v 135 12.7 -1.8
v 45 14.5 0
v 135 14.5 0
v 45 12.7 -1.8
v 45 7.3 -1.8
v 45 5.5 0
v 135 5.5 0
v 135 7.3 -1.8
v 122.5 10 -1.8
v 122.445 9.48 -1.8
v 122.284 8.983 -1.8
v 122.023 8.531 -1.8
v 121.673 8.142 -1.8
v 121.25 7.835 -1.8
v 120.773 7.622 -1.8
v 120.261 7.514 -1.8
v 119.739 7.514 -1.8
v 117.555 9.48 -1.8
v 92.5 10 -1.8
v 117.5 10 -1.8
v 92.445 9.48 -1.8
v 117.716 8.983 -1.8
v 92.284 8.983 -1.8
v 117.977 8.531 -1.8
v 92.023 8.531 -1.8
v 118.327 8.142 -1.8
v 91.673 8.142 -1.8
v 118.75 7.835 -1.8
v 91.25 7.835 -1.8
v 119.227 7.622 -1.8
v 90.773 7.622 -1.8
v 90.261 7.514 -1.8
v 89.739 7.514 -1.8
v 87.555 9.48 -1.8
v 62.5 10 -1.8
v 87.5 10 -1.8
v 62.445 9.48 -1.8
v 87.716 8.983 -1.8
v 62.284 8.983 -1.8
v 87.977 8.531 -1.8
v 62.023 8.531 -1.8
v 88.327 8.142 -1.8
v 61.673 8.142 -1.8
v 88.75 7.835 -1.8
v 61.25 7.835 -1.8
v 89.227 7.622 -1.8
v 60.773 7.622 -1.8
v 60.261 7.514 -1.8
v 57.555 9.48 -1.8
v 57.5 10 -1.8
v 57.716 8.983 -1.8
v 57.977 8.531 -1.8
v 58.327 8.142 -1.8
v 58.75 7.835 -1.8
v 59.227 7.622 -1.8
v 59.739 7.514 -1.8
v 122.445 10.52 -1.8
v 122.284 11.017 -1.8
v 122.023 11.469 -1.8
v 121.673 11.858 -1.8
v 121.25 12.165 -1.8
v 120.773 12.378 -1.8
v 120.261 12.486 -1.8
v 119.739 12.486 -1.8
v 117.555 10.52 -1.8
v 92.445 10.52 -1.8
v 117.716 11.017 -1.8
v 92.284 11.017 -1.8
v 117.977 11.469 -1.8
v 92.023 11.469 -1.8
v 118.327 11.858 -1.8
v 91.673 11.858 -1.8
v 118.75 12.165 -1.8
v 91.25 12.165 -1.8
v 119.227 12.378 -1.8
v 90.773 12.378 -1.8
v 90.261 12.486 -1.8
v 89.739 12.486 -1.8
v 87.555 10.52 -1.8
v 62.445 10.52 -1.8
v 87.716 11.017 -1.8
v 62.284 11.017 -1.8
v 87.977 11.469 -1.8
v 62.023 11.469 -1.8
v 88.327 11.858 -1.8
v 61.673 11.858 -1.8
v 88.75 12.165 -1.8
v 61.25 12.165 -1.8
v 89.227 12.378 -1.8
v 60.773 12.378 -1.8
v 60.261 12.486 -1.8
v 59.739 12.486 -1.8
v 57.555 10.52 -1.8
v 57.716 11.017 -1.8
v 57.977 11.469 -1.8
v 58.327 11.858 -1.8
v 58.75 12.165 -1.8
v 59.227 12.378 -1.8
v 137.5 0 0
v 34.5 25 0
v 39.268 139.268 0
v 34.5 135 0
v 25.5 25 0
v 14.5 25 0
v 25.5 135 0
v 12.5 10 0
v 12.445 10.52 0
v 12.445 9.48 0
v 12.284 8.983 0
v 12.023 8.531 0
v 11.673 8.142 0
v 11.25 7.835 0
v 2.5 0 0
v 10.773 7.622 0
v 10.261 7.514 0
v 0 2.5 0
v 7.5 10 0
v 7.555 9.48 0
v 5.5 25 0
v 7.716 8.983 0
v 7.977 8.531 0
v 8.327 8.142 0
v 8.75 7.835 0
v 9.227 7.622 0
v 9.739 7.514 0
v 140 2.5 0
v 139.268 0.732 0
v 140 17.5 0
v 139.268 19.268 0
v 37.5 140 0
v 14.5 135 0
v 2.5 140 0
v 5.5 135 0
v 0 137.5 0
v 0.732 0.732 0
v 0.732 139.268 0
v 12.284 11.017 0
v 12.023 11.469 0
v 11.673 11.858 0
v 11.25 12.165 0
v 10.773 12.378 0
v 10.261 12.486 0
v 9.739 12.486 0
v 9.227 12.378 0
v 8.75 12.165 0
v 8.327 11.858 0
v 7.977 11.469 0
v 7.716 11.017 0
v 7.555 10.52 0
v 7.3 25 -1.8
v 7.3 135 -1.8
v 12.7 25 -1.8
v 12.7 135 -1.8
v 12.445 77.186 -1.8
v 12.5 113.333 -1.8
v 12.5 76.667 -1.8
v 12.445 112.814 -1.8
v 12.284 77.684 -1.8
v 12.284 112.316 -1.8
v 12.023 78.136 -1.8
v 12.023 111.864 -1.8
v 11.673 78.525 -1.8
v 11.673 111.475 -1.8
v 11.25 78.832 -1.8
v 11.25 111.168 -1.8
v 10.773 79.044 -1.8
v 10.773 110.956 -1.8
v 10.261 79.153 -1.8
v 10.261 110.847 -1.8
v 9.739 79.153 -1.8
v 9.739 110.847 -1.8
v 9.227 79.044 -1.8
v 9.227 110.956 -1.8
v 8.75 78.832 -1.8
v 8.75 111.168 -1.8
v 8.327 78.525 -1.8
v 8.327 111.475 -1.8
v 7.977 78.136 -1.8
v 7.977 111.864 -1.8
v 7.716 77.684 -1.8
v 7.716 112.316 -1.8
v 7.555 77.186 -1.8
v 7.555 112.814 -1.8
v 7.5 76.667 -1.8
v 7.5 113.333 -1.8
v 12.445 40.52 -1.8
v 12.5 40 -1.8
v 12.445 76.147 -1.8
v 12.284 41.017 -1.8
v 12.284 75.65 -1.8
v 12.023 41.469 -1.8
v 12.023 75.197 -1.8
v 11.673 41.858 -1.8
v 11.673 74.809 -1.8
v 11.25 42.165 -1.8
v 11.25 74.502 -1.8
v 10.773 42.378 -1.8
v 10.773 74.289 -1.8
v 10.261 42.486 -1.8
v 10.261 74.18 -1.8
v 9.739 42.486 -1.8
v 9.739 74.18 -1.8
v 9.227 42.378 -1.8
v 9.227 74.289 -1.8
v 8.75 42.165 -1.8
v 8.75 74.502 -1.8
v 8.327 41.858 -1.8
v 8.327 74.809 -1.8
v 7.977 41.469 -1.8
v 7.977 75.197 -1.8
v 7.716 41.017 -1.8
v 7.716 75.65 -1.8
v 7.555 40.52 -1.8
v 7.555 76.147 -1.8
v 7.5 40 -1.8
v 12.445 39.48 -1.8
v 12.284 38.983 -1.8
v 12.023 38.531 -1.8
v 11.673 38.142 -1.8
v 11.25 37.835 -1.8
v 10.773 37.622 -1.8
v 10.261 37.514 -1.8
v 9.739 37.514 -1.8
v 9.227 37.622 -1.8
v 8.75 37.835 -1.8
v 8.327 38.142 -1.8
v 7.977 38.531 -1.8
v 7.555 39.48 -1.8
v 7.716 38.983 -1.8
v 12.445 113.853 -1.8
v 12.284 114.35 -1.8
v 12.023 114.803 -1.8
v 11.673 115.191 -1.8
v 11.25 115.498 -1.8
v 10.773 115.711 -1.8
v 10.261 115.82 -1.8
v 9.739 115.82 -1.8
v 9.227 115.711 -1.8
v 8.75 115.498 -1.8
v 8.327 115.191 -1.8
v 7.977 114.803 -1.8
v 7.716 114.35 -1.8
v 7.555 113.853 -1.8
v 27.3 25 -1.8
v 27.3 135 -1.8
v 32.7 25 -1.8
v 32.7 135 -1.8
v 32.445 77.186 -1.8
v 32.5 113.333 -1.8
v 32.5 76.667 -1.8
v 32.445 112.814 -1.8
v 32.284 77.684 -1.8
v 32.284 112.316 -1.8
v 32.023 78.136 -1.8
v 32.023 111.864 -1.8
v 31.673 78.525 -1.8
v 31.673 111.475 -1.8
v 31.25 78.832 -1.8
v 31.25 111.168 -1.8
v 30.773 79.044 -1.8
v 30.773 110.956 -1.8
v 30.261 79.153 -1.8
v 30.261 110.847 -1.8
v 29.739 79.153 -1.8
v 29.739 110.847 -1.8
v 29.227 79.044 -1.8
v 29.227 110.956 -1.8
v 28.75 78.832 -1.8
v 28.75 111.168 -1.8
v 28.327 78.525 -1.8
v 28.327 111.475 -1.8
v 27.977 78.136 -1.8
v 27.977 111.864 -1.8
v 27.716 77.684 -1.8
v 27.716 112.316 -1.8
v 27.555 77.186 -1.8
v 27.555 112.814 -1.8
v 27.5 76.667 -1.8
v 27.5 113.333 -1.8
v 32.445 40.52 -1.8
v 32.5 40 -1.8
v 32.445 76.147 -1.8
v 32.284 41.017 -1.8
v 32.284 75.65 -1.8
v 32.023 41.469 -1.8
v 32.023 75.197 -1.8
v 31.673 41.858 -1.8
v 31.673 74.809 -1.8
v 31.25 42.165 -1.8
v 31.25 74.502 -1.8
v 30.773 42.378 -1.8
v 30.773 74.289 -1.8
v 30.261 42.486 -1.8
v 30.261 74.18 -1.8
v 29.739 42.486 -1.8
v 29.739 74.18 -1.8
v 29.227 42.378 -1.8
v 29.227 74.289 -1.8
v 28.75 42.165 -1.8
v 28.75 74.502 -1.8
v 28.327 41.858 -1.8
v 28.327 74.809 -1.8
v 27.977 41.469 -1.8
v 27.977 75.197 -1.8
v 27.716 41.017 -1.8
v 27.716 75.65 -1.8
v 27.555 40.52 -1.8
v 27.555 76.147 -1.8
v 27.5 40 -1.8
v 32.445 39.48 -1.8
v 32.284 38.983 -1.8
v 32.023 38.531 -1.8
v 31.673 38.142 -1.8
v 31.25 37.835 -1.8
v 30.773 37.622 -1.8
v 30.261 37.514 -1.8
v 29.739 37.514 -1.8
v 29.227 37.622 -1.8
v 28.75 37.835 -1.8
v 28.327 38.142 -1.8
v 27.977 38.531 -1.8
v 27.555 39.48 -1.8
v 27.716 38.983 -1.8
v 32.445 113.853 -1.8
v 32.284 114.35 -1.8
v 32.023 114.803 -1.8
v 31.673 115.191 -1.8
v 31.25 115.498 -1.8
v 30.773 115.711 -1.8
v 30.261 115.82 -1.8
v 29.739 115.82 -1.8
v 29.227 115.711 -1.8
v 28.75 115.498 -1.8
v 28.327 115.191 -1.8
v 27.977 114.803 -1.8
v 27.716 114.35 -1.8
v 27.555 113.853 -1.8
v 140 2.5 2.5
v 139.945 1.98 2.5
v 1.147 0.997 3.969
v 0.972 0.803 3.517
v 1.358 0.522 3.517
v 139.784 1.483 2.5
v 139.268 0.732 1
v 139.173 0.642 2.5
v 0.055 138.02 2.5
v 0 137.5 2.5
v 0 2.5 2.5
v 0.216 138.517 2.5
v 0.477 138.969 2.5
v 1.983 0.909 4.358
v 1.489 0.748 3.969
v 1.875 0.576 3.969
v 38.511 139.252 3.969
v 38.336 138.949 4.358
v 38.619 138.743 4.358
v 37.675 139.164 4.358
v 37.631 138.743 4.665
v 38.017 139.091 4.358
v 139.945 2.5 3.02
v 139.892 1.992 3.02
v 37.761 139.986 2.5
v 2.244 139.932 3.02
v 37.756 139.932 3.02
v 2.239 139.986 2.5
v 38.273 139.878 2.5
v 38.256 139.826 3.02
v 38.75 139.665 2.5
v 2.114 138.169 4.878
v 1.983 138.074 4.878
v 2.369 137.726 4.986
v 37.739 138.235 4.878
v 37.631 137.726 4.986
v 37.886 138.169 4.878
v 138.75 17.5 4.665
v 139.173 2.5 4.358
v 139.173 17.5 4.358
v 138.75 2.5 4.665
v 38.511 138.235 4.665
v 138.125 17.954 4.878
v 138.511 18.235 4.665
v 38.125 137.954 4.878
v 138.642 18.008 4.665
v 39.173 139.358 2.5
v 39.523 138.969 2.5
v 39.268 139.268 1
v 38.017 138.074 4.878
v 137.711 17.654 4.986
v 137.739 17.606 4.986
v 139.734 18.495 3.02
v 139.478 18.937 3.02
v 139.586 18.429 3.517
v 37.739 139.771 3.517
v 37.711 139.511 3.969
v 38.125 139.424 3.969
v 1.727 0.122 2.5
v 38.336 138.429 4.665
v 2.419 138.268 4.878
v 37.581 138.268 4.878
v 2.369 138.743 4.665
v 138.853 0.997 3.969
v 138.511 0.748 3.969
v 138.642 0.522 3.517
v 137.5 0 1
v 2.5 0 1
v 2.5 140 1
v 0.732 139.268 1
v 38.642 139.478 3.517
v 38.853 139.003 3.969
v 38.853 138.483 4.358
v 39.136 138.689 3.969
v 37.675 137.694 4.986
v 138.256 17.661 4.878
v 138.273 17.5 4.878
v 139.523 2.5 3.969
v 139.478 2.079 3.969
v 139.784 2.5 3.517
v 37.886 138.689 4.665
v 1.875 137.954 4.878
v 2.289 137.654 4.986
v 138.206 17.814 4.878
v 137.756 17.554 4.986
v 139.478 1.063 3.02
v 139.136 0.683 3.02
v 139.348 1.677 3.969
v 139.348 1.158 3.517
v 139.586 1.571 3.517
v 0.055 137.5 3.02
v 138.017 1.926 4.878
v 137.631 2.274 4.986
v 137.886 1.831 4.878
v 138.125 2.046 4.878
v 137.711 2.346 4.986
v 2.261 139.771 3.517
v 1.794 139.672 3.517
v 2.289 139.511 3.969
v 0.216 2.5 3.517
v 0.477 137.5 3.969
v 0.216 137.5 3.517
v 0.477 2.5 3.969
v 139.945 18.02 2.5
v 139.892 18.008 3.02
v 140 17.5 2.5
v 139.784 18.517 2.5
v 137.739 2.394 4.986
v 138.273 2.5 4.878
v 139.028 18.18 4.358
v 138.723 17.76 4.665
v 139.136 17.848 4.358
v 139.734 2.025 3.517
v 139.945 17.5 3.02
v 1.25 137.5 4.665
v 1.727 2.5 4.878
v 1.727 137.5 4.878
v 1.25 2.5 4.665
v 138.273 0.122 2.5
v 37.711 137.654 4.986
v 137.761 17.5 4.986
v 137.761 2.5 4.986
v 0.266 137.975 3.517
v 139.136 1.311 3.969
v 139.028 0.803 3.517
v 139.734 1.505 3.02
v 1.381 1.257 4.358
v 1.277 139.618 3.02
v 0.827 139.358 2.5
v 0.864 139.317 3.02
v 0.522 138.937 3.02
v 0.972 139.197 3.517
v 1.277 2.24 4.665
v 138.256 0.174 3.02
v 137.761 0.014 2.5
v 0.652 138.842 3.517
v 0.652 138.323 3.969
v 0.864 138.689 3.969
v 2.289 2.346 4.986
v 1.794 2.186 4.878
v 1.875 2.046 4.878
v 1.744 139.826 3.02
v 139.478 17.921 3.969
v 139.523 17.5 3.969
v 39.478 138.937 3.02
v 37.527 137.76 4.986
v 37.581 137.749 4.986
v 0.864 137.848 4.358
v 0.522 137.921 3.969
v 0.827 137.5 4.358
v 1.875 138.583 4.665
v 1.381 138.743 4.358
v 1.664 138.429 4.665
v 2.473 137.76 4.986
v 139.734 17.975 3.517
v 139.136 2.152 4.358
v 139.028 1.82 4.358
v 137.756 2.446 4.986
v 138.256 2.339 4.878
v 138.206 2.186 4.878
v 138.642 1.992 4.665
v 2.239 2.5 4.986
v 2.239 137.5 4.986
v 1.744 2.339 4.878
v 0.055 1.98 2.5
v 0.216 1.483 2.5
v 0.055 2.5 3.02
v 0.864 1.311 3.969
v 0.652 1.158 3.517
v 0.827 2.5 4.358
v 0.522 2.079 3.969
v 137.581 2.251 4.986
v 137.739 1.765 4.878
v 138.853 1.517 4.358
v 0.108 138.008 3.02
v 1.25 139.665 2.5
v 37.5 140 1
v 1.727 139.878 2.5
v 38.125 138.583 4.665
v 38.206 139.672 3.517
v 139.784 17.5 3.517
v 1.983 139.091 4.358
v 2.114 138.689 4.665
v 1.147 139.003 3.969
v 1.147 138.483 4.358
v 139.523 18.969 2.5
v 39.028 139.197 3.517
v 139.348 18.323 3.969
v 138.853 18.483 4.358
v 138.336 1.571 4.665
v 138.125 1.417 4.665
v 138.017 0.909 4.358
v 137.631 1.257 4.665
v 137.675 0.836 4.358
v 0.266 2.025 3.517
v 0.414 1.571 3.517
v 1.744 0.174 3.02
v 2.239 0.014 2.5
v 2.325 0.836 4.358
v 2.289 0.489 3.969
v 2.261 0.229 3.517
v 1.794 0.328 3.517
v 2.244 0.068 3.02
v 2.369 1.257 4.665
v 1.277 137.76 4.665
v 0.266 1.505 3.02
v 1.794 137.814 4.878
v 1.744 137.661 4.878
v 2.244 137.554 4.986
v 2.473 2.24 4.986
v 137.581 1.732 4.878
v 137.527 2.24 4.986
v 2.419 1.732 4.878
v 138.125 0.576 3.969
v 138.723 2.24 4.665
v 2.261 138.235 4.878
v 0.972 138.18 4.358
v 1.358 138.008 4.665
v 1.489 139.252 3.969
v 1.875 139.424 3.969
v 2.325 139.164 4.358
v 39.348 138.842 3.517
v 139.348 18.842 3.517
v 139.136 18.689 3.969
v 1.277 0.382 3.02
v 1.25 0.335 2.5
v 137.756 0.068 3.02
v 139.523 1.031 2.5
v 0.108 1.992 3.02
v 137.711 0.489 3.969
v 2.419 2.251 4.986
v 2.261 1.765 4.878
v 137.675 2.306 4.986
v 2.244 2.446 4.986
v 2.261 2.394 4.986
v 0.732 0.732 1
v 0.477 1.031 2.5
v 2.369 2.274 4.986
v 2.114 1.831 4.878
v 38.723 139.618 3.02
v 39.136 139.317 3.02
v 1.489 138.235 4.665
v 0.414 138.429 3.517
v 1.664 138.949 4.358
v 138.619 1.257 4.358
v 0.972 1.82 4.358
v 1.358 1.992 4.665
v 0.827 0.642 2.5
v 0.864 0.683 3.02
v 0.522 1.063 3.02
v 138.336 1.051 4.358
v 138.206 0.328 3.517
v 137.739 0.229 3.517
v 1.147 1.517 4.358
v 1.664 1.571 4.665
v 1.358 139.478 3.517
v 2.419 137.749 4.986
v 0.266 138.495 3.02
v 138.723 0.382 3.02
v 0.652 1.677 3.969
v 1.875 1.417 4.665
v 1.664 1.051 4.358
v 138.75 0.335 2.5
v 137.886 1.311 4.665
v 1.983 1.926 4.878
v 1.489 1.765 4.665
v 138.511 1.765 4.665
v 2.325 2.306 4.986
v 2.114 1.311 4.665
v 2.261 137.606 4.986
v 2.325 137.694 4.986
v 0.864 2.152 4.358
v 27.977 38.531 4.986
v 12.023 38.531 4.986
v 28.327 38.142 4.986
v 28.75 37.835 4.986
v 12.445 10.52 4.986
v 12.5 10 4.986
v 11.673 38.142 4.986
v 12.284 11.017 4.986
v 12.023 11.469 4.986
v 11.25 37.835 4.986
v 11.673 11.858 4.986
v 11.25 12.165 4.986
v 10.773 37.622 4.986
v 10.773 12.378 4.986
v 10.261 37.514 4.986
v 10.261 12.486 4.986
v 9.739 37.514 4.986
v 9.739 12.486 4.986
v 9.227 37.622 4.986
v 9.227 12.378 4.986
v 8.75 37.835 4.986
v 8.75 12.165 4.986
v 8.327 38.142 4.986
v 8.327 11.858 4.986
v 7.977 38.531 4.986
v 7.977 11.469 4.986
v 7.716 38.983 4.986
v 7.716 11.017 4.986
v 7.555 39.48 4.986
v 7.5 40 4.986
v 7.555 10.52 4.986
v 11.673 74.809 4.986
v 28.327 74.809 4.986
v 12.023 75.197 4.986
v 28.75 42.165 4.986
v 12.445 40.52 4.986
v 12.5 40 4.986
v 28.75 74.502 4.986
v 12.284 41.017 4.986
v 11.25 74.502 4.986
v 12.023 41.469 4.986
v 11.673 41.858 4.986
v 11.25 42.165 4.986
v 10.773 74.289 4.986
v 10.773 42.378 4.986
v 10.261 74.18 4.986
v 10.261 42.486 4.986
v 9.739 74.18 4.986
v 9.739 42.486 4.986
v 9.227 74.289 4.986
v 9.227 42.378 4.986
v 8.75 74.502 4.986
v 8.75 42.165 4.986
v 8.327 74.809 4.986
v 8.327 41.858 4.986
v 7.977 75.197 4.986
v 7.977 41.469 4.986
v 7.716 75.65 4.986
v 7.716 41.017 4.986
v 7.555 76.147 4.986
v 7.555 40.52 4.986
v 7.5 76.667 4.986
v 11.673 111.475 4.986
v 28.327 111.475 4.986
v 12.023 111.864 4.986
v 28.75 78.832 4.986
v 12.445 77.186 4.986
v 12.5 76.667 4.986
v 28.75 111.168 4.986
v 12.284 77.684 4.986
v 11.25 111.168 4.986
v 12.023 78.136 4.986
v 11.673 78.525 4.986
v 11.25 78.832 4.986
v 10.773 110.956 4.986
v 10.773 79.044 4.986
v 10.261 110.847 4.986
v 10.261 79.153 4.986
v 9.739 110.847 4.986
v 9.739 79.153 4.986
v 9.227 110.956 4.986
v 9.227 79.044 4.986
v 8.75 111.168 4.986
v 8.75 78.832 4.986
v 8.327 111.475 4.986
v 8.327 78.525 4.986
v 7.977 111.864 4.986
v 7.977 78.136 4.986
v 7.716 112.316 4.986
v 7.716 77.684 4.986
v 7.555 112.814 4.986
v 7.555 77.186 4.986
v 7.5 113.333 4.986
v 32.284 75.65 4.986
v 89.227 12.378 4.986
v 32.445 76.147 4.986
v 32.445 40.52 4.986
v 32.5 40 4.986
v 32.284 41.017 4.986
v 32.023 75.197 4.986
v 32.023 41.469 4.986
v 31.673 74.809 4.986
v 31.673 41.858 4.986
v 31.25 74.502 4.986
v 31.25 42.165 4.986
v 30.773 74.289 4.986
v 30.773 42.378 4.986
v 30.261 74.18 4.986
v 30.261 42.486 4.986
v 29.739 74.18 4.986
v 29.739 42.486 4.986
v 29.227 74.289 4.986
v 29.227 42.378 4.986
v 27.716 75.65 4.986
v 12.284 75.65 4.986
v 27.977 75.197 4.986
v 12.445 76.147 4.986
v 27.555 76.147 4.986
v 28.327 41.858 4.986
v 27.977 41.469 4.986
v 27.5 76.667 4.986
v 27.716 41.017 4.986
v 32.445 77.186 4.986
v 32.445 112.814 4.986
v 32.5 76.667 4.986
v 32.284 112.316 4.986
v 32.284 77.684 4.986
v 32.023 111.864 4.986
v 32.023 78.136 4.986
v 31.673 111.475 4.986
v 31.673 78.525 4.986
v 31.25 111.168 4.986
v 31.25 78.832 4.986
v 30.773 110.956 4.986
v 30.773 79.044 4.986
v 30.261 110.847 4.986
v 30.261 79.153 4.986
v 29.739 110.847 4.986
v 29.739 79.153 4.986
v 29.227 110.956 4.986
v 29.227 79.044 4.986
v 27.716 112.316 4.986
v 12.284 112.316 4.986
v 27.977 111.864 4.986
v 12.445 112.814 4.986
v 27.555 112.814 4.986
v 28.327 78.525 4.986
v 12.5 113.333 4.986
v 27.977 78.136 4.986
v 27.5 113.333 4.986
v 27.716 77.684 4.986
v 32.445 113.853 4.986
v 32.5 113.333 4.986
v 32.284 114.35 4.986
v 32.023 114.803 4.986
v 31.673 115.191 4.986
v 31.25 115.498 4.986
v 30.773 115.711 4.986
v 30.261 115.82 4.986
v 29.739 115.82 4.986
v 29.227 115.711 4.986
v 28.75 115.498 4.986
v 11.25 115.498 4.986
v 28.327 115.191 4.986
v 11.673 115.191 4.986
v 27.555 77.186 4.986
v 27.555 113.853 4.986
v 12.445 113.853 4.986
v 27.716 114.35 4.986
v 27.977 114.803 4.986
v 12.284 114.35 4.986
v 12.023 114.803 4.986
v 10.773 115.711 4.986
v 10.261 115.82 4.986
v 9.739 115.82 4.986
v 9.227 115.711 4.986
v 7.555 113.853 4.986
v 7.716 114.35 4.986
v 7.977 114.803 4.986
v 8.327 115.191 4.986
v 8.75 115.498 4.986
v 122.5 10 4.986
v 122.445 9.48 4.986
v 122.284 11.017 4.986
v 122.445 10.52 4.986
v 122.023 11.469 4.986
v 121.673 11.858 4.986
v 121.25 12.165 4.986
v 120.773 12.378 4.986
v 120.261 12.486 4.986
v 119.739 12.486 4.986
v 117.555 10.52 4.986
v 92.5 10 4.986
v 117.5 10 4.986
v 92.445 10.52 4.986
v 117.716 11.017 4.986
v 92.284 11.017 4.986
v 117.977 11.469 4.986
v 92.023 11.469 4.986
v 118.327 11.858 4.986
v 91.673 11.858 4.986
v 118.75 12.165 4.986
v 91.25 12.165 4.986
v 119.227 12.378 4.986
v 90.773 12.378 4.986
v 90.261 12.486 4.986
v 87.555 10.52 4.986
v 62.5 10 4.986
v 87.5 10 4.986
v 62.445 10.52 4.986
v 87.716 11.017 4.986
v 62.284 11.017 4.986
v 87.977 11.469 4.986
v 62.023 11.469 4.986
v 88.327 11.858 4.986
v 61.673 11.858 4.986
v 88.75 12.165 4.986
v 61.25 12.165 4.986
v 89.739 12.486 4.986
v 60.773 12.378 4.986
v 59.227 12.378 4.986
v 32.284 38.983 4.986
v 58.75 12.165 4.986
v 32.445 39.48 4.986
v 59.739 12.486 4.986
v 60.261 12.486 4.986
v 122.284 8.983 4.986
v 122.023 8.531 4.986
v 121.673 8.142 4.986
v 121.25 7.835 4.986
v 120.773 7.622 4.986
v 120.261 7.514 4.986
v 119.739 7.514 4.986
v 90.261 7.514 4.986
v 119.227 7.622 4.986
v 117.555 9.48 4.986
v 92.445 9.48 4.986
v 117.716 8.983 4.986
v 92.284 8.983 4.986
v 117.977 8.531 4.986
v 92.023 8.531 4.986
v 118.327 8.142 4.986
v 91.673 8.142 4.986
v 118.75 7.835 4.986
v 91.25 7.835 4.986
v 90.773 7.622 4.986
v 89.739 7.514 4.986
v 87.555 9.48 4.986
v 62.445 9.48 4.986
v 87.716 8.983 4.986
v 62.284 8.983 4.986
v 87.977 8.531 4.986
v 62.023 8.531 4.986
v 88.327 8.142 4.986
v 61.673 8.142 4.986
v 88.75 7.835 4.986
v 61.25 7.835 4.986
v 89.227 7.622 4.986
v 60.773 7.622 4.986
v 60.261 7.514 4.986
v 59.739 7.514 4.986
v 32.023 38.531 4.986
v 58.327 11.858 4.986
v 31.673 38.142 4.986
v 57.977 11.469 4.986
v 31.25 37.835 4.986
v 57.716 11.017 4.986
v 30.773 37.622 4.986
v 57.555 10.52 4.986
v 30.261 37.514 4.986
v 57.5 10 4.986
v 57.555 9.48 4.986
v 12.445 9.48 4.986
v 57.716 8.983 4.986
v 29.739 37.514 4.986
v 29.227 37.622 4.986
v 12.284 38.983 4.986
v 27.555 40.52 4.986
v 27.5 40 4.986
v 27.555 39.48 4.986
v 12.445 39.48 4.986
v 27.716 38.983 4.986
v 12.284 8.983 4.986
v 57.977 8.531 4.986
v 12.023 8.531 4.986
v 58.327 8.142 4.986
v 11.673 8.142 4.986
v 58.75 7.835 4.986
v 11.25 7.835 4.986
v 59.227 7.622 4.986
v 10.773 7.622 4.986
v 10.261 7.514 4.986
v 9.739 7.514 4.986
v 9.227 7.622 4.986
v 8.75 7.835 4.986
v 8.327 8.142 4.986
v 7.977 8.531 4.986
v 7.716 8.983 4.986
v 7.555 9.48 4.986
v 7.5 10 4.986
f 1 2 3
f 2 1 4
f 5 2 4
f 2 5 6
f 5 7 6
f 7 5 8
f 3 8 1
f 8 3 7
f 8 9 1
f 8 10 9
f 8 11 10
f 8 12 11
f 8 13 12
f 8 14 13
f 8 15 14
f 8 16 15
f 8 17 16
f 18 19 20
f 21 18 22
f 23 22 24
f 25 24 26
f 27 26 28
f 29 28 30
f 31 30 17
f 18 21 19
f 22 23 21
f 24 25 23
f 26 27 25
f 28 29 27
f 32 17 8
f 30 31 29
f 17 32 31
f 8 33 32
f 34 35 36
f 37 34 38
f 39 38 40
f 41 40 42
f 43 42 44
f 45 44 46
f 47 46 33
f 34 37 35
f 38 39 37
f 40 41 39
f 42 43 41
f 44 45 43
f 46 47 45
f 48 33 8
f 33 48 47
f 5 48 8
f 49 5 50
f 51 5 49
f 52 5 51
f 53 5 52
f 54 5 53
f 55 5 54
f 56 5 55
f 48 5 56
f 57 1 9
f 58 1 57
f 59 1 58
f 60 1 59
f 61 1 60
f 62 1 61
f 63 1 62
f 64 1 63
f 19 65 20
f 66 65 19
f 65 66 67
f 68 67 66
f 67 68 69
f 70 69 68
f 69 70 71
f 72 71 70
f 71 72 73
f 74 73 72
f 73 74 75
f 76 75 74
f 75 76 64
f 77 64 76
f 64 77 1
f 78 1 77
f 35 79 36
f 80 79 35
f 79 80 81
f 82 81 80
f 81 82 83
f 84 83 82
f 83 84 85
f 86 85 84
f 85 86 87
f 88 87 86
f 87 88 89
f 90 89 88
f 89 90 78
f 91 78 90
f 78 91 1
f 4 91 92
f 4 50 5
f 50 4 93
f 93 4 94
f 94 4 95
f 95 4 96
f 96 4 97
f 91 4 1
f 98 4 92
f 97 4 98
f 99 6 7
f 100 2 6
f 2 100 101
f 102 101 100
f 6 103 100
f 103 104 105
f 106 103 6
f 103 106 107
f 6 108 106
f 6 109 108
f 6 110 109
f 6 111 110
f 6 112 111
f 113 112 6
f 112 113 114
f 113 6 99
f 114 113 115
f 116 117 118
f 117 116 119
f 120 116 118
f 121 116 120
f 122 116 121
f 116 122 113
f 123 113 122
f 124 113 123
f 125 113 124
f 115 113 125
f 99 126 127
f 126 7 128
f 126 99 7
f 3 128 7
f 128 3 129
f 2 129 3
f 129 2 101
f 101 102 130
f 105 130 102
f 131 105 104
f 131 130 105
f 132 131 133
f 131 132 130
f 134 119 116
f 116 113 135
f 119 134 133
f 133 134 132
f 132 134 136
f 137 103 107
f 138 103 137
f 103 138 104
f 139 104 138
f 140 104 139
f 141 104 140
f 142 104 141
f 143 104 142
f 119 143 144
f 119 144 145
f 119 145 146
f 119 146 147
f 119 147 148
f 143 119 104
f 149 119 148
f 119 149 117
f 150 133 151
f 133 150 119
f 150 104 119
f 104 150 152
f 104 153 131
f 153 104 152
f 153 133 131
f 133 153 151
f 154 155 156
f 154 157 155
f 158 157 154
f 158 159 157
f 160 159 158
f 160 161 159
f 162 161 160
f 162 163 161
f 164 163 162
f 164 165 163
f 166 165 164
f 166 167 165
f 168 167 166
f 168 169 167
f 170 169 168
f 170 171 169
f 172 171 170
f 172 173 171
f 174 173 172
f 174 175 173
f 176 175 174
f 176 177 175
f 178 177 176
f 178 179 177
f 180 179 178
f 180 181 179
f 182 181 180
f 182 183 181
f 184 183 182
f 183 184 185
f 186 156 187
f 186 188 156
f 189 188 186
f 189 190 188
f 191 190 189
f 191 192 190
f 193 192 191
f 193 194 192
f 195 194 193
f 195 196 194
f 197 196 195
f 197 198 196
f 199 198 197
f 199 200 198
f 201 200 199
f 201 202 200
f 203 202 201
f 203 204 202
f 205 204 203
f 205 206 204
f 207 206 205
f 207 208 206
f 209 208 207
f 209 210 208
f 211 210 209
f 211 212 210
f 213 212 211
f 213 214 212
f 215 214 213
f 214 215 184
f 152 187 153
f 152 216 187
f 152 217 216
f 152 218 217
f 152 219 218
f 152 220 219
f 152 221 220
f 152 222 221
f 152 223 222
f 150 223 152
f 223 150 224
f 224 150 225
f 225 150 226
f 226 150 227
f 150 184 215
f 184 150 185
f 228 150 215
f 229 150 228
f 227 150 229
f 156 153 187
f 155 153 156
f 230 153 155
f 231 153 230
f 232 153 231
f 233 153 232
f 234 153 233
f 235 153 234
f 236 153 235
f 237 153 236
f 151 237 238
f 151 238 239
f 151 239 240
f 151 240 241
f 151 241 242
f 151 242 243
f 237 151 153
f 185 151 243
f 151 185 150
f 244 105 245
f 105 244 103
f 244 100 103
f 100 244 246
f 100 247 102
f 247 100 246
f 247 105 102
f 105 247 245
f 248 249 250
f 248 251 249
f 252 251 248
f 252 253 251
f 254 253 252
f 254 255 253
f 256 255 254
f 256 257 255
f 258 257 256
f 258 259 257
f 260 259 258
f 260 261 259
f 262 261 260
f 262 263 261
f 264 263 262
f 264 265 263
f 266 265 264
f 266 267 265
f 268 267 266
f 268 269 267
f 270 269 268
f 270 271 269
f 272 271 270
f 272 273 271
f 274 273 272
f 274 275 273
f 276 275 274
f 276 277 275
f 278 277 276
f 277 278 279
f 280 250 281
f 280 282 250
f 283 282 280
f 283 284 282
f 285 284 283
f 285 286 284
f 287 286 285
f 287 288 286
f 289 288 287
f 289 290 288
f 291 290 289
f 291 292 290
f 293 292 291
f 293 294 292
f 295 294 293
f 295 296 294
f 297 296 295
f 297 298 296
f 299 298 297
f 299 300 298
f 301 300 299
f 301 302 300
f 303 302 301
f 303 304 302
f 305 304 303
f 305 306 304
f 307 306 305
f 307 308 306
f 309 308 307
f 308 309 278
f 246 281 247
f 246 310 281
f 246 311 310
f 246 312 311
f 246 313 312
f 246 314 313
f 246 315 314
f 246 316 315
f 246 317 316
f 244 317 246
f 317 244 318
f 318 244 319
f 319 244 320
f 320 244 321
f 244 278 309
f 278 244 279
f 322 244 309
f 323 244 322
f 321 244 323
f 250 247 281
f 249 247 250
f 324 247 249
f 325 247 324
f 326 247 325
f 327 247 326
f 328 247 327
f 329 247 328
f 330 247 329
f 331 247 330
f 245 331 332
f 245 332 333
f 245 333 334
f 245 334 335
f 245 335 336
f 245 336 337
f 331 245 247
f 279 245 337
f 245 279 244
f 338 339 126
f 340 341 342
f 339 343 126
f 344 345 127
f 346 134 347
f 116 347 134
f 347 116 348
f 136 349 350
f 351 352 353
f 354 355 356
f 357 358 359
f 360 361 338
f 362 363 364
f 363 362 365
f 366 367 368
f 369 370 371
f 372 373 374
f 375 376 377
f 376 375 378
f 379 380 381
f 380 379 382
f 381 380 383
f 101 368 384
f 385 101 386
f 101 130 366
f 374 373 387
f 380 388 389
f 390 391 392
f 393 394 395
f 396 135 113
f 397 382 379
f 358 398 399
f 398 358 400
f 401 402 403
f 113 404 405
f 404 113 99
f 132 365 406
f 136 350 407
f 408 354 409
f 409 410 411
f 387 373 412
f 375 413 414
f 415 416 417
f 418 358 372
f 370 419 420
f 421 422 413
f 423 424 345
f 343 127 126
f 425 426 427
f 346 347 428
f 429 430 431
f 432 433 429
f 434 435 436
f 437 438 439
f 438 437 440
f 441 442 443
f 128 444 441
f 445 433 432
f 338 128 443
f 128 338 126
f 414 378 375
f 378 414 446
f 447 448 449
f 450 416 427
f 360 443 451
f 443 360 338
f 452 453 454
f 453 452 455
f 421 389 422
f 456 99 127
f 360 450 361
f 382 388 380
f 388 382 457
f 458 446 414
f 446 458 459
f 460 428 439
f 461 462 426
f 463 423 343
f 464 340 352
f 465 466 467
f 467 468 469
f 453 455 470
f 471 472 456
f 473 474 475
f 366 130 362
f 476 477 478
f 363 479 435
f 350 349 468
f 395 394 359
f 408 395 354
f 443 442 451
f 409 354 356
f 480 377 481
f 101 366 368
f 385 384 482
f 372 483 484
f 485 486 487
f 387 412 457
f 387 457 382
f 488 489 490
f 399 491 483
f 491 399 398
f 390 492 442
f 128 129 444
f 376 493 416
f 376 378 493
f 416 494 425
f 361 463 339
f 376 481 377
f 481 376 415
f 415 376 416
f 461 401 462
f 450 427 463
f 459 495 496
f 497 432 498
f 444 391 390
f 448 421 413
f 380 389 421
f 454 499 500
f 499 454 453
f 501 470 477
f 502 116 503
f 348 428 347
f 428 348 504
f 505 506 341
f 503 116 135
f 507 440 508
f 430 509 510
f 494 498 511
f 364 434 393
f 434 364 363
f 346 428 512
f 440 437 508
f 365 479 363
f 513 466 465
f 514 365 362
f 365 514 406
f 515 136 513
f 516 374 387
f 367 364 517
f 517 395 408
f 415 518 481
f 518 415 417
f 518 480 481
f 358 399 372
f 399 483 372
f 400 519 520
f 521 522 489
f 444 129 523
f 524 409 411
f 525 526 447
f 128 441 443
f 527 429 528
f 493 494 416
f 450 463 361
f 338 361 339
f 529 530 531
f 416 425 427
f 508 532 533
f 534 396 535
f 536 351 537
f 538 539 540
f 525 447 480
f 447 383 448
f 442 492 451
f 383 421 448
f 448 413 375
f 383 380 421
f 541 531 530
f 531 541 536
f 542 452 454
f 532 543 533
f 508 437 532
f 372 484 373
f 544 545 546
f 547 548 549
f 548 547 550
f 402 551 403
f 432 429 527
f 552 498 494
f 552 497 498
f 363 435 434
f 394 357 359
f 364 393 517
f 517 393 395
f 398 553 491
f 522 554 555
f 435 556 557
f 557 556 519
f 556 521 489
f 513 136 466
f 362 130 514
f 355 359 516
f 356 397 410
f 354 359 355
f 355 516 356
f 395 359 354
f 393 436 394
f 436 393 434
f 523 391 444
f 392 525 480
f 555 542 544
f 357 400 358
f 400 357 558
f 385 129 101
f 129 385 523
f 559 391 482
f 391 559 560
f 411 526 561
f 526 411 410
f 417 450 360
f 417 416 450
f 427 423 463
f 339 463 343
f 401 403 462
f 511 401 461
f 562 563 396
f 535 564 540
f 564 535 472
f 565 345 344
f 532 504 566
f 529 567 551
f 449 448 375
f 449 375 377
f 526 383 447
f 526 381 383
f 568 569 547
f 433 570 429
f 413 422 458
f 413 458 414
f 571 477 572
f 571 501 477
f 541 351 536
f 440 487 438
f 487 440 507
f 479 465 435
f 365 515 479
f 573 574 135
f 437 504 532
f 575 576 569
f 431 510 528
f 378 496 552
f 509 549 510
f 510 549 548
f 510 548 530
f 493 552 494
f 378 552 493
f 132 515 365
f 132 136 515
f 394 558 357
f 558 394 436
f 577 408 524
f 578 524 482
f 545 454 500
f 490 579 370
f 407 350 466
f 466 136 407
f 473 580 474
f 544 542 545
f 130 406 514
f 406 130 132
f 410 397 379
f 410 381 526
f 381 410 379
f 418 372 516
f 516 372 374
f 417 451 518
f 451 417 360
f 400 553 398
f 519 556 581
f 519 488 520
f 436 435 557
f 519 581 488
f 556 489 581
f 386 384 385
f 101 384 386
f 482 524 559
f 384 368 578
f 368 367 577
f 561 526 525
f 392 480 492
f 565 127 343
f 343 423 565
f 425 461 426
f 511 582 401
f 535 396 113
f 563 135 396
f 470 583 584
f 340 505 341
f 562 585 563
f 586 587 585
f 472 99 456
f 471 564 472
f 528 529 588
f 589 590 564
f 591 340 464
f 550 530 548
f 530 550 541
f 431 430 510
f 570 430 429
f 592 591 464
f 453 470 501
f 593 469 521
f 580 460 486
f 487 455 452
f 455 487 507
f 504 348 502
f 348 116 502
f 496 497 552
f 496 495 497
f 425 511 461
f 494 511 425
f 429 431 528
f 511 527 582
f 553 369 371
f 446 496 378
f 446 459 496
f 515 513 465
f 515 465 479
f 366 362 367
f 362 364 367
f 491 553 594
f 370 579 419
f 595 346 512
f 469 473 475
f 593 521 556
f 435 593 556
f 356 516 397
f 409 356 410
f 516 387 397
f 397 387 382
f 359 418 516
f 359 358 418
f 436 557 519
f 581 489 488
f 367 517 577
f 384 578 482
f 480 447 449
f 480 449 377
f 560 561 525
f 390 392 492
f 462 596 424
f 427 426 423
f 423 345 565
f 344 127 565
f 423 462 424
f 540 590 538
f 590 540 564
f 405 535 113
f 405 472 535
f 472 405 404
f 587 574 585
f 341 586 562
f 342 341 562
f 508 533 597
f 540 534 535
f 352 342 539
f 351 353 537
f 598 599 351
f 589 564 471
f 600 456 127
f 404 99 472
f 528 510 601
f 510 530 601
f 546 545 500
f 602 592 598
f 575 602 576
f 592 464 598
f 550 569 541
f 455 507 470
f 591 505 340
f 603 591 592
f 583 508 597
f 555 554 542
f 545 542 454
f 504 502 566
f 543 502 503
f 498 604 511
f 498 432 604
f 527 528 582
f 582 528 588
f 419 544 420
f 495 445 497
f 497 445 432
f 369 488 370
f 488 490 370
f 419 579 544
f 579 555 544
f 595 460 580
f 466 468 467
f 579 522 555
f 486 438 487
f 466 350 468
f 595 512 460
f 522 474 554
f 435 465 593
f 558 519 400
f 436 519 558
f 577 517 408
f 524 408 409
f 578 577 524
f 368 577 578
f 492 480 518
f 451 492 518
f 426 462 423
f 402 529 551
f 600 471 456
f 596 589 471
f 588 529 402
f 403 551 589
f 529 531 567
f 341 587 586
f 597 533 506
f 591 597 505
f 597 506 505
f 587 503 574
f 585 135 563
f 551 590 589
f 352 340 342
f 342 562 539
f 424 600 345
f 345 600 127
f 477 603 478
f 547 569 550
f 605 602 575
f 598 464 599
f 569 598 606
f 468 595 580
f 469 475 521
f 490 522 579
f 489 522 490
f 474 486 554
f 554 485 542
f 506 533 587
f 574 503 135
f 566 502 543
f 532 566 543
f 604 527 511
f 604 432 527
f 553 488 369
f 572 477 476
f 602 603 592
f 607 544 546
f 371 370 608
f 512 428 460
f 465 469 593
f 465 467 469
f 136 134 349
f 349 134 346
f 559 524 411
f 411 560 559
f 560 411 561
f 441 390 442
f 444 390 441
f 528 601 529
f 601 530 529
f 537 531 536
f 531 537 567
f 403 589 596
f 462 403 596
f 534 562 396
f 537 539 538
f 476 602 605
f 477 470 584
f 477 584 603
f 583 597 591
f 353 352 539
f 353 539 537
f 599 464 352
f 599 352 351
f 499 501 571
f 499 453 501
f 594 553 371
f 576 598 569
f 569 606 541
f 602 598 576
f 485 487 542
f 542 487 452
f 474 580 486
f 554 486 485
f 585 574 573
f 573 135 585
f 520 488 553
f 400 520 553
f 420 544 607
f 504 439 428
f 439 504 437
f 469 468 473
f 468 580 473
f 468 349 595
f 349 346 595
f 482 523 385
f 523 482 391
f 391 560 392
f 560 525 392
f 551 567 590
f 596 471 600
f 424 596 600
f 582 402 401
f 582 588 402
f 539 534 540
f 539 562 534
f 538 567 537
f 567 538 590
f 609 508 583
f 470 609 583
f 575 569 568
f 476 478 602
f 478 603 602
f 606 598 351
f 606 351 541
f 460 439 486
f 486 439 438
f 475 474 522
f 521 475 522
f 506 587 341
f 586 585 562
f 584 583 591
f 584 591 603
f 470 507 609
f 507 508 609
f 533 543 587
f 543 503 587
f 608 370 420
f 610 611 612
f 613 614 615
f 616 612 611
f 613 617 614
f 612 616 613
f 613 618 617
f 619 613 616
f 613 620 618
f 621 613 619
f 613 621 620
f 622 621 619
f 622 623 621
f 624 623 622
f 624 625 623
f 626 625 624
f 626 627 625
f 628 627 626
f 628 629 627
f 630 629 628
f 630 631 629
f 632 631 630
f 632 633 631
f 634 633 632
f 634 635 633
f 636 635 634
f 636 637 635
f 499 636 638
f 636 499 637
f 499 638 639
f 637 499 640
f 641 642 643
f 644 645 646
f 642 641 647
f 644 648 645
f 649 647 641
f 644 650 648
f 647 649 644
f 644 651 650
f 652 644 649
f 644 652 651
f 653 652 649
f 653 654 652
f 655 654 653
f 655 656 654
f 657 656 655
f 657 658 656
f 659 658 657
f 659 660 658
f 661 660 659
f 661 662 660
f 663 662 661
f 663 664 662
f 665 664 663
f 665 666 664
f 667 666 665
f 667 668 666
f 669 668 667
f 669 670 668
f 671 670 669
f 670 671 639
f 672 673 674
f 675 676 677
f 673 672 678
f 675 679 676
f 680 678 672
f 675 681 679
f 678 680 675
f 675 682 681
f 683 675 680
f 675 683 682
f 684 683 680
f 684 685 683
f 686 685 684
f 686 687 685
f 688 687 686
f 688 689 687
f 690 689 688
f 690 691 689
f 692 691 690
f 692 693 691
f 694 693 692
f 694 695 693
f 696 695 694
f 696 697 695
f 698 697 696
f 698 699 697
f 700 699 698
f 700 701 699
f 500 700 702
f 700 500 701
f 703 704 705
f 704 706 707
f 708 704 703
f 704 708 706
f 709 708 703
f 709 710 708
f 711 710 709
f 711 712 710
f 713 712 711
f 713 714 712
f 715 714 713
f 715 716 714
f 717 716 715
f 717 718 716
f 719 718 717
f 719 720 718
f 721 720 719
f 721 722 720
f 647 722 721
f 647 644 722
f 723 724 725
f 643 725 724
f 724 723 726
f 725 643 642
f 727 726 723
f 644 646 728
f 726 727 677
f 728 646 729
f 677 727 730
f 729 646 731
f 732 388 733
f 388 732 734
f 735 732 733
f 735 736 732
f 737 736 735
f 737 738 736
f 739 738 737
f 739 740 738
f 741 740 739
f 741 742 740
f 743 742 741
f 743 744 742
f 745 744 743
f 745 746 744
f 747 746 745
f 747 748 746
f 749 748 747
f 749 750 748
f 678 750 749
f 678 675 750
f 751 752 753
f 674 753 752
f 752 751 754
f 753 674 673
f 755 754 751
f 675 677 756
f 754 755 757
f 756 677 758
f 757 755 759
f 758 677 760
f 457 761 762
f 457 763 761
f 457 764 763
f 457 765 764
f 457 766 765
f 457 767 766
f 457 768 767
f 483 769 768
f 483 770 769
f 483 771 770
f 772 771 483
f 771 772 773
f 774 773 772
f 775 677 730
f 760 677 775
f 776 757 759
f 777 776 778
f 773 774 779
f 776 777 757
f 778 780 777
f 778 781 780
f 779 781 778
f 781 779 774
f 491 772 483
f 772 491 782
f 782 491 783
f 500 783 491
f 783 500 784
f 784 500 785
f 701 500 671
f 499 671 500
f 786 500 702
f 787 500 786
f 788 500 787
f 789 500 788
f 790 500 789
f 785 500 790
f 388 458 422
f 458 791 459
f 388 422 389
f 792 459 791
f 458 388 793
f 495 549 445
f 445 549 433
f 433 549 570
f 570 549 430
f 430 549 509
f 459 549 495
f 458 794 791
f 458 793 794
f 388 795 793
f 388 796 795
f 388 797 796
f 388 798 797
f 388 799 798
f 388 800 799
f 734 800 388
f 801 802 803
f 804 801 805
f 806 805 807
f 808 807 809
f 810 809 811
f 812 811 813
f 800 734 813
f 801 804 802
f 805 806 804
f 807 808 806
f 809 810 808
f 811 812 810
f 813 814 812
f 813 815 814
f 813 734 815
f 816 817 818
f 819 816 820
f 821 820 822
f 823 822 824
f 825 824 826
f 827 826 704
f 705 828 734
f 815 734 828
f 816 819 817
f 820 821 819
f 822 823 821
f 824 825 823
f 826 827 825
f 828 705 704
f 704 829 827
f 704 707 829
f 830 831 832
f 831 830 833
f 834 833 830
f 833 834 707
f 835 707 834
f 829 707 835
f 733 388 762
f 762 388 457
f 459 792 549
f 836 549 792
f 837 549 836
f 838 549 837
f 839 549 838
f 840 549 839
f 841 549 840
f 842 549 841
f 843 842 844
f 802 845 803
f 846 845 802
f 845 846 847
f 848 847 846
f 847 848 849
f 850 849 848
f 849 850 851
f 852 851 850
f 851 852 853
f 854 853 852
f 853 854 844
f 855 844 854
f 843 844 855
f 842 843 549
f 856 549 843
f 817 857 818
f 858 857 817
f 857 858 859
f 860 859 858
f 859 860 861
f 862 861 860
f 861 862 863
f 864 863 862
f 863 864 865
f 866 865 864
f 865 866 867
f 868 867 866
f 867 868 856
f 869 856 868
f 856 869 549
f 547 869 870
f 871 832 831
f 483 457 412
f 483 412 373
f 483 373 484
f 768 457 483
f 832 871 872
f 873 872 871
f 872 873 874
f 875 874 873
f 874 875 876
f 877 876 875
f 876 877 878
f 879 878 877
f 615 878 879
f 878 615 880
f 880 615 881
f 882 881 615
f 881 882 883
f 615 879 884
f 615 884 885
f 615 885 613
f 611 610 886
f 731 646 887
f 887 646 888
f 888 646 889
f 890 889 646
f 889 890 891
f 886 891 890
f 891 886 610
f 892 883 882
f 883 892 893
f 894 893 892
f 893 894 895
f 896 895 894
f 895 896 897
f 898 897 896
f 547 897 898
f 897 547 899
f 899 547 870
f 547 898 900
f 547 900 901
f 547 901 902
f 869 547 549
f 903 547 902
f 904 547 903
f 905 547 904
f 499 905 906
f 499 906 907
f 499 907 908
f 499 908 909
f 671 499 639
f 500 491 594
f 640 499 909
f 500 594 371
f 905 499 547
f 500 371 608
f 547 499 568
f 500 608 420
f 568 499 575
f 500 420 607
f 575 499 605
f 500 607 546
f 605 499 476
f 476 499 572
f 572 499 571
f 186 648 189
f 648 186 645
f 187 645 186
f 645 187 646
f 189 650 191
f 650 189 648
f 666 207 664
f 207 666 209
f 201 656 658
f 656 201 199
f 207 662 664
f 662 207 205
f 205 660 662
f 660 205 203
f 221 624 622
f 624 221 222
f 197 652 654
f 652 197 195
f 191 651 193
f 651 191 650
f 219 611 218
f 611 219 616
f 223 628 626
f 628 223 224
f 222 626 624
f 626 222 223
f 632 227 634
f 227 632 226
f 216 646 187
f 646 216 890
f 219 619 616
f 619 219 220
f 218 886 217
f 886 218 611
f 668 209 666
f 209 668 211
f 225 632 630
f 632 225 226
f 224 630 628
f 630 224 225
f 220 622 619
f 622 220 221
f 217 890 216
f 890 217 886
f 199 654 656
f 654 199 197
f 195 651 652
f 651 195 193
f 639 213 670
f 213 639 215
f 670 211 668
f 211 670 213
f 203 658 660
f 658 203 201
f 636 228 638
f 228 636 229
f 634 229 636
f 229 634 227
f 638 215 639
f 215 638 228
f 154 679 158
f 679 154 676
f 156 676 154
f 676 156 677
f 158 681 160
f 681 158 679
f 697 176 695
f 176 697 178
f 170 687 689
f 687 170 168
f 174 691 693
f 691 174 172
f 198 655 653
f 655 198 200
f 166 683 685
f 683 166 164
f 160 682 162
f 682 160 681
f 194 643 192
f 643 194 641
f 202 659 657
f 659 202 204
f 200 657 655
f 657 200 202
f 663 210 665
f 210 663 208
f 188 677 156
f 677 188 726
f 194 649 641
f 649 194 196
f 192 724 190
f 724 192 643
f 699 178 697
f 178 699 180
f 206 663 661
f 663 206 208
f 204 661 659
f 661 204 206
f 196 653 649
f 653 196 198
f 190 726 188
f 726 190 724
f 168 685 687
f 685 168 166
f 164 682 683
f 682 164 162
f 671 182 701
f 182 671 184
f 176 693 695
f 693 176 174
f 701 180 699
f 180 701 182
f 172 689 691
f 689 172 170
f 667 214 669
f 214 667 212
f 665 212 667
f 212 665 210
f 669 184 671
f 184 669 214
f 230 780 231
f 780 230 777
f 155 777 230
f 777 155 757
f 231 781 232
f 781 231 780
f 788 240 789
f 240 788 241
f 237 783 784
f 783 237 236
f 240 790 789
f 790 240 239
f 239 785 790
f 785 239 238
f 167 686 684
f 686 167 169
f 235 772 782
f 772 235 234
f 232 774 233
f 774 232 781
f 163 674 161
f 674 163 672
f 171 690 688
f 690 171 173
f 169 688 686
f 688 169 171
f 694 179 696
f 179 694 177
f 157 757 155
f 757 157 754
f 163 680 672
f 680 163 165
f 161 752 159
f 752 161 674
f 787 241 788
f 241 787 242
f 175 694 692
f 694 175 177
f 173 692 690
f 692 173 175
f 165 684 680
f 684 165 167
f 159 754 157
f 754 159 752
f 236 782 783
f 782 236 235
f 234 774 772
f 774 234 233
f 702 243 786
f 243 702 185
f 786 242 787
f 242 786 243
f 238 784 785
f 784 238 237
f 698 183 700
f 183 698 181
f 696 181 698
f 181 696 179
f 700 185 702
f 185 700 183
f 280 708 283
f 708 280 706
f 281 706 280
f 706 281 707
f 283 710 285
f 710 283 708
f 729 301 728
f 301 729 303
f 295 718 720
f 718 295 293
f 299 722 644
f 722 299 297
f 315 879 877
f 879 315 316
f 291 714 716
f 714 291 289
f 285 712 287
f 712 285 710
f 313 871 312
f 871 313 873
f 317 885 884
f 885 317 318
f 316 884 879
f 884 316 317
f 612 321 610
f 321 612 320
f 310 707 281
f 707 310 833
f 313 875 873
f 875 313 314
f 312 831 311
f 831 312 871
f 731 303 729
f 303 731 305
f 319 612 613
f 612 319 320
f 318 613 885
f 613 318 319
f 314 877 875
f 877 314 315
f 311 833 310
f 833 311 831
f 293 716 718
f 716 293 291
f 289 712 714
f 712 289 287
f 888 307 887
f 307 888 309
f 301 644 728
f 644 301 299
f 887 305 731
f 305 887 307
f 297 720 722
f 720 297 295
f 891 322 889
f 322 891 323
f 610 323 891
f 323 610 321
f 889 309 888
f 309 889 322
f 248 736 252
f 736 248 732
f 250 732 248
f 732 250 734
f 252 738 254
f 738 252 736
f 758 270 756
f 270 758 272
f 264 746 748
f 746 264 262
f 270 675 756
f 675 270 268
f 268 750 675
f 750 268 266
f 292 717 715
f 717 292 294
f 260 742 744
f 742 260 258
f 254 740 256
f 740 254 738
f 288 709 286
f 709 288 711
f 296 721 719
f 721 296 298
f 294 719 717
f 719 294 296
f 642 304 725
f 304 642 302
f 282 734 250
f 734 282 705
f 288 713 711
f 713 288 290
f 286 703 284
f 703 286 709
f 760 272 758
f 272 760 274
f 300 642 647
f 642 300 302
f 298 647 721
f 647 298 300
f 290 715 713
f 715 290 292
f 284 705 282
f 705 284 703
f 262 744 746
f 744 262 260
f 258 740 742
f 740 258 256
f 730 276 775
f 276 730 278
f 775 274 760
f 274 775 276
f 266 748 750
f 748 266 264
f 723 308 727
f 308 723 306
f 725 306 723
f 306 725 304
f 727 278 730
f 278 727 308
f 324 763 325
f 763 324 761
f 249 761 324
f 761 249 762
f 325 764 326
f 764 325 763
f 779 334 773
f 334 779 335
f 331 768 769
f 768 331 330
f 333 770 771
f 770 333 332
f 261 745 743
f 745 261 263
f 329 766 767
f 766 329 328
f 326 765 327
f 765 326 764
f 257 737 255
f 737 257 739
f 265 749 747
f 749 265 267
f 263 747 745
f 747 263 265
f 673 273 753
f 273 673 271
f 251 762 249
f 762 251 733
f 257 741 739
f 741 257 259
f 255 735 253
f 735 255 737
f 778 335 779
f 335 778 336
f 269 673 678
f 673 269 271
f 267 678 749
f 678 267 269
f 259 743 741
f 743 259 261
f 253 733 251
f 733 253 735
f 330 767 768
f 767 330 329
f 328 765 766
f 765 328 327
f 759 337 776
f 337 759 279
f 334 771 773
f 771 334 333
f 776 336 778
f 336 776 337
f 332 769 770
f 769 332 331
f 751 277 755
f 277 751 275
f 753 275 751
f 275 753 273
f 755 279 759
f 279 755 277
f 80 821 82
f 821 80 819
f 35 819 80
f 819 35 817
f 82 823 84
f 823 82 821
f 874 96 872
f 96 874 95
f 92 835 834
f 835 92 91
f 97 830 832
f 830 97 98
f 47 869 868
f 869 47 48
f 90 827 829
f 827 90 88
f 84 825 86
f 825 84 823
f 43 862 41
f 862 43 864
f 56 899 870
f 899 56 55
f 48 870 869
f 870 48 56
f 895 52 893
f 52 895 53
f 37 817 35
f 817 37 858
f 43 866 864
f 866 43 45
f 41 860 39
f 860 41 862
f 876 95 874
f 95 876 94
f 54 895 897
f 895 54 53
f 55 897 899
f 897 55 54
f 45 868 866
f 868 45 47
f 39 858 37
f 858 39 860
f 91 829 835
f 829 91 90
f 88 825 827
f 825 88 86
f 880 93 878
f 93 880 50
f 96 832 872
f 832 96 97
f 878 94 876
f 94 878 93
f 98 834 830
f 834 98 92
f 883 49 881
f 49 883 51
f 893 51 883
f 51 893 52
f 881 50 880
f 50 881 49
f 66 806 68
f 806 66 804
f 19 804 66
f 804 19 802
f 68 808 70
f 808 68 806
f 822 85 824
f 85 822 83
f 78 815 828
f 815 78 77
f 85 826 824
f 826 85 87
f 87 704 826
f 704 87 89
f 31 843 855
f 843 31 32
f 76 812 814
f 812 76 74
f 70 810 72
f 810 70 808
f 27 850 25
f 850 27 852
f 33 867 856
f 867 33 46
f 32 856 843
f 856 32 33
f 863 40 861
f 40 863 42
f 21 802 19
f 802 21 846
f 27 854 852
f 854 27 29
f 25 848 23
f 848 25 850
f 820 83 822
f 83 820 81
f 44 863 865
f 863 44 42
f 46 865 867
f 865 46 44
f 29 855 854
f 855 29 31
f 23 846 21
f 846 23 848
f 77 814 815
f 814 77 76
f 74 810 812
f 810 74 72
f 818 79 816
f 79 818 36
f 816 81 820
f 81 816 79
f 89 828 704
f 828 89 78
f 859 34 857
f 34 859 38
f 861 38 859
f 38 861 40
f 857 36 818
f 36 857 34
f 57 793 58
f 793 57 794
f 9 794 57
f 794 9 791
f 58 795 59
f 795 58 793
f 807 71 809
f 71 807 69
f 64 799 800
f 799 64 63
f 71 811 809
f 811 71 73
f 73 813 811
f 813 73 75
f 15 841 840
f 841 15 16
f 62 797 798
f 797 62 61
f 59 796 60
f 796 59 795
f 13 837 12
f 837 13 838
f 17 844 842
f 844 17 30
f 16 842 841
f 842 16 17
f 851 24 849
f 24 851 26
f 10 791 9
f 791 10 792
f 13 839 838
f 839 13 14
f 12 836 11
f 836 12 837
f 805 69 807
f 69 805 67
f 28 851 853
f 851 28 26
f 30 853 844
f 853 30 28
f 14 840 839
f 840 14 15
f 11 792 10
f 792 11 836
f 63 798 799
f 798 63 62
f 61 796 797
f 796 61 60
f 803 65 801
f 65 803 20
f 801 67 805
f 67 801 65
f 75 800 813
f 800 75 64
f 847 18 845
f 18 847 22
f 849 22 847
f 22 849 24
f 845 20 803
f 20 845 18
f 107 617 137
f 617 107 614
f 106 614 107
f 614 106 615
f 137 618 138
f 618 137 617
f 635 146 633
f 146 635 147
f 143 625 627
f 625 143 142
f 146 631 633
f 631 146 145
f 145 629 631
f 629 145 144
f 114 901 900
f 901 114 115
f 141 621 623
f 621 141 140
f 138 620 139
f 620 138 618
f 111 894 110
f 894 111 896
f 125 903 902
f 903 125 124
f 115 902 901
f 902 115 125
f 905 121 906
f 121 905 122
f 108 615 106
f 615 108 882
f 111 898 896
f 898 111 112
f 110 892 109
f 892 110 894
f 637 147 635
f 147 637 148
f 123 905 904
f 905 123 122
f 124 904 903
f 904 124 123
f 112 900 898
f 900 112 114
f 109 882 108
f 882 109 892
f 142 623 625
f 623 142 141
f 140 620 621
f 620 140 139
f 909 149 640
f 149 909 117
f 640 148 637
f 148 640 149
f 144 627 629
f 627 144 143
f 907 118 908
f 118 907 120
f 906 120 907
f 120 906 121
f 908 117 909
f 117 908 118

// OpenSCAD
// file: bom.scad
module bom(code, desc, category) {
	echo(str(
    "BOM: { \"code\" : \"",
    code,
    "\", \"description\" : \"",
    desc,
    "\", \"categories\" : ",
    category,
    " }"
  ));
}
// file: vslot.scad
include <MCAD/units.scad>;
include <MCAD/materials.scad>
include <MCAD/shapes.scad>;
use <bom.scad>;

vslot_color_black = [0.27, 0.27, 0.3];
vslot_color = Aluminum;

module vslot(length=50, sections=1, finish) {
	size = sections * 20;
	bom(str("vslot20x", size, "x", length), str("v-slot 20x", size, " (", length , "mm)"), ["rail", "extrusion", "structure"]);
	cutext = [[12.00,4.50],[10.00,4.50],[8.20,2.78],[8.20,5.50],[6.56,5.50],[3.90,2.84],[3.90,0.21],[3.69,0.00],[3.90,-0.21],[3.90,-2.84],[6.56,-5.50],[8.20,-5.50],[8.20,-2.78],[10.00,-4.50],[12.00,-4.50]];
	cutint = [[16.10,0.21],[16.10,2.84],[12.70,6.24],[12.70,8.78],[7.30,8.78],[7.30,6.24],[3.90,2.84],[3.90,0.21],[3.69,0.00],[3.90,-0.21],[3.90,-2.84],[7.30,-6.24],[7.30,-8.78],[12.70,-8.78],[12.70,-6.24],[16.10,-2.84],[16.10,-0.21],[16.31,0.00],];
	cutcorner = [[8.20,8.20],[6.57,8.20],[6.57,7.66],[7.66,6.57],[8.20,6.57]];

	module profile() {
		difference() {
			translate([0,0,length/2]) roundedBox(20 * sections, 20, length, 1.5);
			for(i = [0,180]) rotate([0,0,-i]) translate([10 * (sections - 1), 0, -epsilon/2]) {
				linear_extrude(length+20) polygon(cutext);
				translate([5,-2.89,-20]) cube([10,5.78,length+40]);
			}

			for(i = [90,270]) rotate([0,0,-i])
				for(j = [0:sections-1]) translate([0, (sections - 1) * 10 - 20 * j, -epsilon/2]) {
					linear_extrude(length+epsilon) polygon(cutext);
					translate([5,-2.89,-20]) cube([10,5.78,length+40]);
				}

			for(i = [0:sections-1]) translate([i * 20 - 10 * (sections - 1),0,-epsilon/2])
				cylinder(length+20, 2.1, 2.1);

			for(i = [90,270]) rotate([0,0,-i])
				translate([0,(sections - 1) * 10,-epsilon/2])
				linear_extrude(length+epsilon) polygon(cutcorner);
			for(i = [ 0,180]) rotate([0,0,-i])
				translate([(sections - 1) * 10,0,-epsilon/2])
				linear_extrude(length+epsilon) polygon(cutcorner);

			if(sections > 1)
				for(i = [0:sections-2]) translate([(sections - 3) * 10 - i * 20, 0, -epsilon/2])
					linear_extrude(length+epsilon) polygon(cutint);
		}
	}

	if(finish)
		color(finish) profile();
	else
		color(vslot_color) profile();
}

module vslot20x20(length, finish) { vslot(length, 1, finish); }

module vslot20x40(length, finish) { vslot(length, 2, finish); }

module vslot20x60(length, finish) { vslot(length, 3, finish); }

module vslot20x80(length, finish) { vslot(length, 4, finish); }


module vslot_test() {
	$fn = 32;

	vslot20x20(100);

	translate([0, 40, 0])
	vslot20x40(100, vslot_color_black);

	translate([0, 80, 0])
	vslot20x60(100);

	translate([0, 120, 0])
	vslot20x80(100, vslot_color_black);
}
// main file
include <MCAD/shapes.scad>
include <vslot.scad>
//color([1,1,1]) %cube([140,140,5]);


module slot_fill(length = 20){
  difference(){
		translate([0, 0, 0]) rotate([0, 0, 0])
		 cylinder(r=4.5, h=length, center=true,  $fn=4);	

//plane sides
		translate([-3.8, 0, 0]) rotate([0, 0, 0])
		 cube([4, 20, length*2], center=true);
		translate([3, 0, 0]) rotate([0, 0, 0])
		 cube([6, 20, length*2], center=true);
  }
}

module corner(height=1,width=1){
  offset=2.5;
  thickness=2.5;
  radius=5;
  size=140;
  difference(){
    union(){
      hull(){
        translate([10*width,size/2,0.5]) roundedBox(20*width,size,1, 2.5);
        translate([size/2,10*height,0.5]) roundedBox(size,20*height,1, 2.5);
        translate([offset,offset,thickness]) sphere(d=radius, $fn=30);
        translate([offset,size-offset,thickness]) sphere(d=radius, $fn=30);
        translate([(width*20)-offset,size-offset,thickness]) sphere(d=radius, $fn=30);

        translate([size-offset,offset,thickness]) sphere(d=radius, $fn=30);
        translate([size-offset,(height*20)-offset,thickness]) sphere(d=radius, $fn=30);
      }
      for(i=[10 : 20 : (20*height)]){
        translate([(size/2)+(10*width),i,0]) rotate([0,-90,0]) slot_fill(length=size-10-(20*width));
      }
      for(i=[10 : 20 : (20*width)]){
        translate([i,(size/2)+(10*height),0]) rotate([90,-90,0]) slot_fill(length=size-10-(20*height));
      }
    }
    translate([10,10,1]) cylinder(d=5, h=thickness+radius+1, center=true,  $fn=30);
    ylength=size-10-(20*height);
    for(X=[10 : 20 : (20*width)], Y=[5 : ylength/3 : ylength]){
      translate([X,(20*height)+15+Y,1]) cylinder(d=5, h=thickness+radius+1, center=true,  $fn=30);
    }
    xlength=size-10-(20*width);
    for(Y=[10 : 20 : (20*height)],X=[5 : xlength/3 : xlength]){
      translate([(20*width)+15+X,Y,1]) cylinder(d=5, h=thickness+radius+1, center=true,  $fn=30);
    }
  }
}

corner(height=1,width=2);
//translate([20,120,-10]) rotate([90,0,0]) vslot20x40(100, vslot_color_black);
//translate([0,10,-10]) rotate([0,90,0]) vslot20x20(140, vslot_color_black);

//translate([10,10,-10]) rotate([0,0,0]) vslot20x20(140, vslot_color_black);


//roundedBox(20, 140, 1, 2.5, center=true);
